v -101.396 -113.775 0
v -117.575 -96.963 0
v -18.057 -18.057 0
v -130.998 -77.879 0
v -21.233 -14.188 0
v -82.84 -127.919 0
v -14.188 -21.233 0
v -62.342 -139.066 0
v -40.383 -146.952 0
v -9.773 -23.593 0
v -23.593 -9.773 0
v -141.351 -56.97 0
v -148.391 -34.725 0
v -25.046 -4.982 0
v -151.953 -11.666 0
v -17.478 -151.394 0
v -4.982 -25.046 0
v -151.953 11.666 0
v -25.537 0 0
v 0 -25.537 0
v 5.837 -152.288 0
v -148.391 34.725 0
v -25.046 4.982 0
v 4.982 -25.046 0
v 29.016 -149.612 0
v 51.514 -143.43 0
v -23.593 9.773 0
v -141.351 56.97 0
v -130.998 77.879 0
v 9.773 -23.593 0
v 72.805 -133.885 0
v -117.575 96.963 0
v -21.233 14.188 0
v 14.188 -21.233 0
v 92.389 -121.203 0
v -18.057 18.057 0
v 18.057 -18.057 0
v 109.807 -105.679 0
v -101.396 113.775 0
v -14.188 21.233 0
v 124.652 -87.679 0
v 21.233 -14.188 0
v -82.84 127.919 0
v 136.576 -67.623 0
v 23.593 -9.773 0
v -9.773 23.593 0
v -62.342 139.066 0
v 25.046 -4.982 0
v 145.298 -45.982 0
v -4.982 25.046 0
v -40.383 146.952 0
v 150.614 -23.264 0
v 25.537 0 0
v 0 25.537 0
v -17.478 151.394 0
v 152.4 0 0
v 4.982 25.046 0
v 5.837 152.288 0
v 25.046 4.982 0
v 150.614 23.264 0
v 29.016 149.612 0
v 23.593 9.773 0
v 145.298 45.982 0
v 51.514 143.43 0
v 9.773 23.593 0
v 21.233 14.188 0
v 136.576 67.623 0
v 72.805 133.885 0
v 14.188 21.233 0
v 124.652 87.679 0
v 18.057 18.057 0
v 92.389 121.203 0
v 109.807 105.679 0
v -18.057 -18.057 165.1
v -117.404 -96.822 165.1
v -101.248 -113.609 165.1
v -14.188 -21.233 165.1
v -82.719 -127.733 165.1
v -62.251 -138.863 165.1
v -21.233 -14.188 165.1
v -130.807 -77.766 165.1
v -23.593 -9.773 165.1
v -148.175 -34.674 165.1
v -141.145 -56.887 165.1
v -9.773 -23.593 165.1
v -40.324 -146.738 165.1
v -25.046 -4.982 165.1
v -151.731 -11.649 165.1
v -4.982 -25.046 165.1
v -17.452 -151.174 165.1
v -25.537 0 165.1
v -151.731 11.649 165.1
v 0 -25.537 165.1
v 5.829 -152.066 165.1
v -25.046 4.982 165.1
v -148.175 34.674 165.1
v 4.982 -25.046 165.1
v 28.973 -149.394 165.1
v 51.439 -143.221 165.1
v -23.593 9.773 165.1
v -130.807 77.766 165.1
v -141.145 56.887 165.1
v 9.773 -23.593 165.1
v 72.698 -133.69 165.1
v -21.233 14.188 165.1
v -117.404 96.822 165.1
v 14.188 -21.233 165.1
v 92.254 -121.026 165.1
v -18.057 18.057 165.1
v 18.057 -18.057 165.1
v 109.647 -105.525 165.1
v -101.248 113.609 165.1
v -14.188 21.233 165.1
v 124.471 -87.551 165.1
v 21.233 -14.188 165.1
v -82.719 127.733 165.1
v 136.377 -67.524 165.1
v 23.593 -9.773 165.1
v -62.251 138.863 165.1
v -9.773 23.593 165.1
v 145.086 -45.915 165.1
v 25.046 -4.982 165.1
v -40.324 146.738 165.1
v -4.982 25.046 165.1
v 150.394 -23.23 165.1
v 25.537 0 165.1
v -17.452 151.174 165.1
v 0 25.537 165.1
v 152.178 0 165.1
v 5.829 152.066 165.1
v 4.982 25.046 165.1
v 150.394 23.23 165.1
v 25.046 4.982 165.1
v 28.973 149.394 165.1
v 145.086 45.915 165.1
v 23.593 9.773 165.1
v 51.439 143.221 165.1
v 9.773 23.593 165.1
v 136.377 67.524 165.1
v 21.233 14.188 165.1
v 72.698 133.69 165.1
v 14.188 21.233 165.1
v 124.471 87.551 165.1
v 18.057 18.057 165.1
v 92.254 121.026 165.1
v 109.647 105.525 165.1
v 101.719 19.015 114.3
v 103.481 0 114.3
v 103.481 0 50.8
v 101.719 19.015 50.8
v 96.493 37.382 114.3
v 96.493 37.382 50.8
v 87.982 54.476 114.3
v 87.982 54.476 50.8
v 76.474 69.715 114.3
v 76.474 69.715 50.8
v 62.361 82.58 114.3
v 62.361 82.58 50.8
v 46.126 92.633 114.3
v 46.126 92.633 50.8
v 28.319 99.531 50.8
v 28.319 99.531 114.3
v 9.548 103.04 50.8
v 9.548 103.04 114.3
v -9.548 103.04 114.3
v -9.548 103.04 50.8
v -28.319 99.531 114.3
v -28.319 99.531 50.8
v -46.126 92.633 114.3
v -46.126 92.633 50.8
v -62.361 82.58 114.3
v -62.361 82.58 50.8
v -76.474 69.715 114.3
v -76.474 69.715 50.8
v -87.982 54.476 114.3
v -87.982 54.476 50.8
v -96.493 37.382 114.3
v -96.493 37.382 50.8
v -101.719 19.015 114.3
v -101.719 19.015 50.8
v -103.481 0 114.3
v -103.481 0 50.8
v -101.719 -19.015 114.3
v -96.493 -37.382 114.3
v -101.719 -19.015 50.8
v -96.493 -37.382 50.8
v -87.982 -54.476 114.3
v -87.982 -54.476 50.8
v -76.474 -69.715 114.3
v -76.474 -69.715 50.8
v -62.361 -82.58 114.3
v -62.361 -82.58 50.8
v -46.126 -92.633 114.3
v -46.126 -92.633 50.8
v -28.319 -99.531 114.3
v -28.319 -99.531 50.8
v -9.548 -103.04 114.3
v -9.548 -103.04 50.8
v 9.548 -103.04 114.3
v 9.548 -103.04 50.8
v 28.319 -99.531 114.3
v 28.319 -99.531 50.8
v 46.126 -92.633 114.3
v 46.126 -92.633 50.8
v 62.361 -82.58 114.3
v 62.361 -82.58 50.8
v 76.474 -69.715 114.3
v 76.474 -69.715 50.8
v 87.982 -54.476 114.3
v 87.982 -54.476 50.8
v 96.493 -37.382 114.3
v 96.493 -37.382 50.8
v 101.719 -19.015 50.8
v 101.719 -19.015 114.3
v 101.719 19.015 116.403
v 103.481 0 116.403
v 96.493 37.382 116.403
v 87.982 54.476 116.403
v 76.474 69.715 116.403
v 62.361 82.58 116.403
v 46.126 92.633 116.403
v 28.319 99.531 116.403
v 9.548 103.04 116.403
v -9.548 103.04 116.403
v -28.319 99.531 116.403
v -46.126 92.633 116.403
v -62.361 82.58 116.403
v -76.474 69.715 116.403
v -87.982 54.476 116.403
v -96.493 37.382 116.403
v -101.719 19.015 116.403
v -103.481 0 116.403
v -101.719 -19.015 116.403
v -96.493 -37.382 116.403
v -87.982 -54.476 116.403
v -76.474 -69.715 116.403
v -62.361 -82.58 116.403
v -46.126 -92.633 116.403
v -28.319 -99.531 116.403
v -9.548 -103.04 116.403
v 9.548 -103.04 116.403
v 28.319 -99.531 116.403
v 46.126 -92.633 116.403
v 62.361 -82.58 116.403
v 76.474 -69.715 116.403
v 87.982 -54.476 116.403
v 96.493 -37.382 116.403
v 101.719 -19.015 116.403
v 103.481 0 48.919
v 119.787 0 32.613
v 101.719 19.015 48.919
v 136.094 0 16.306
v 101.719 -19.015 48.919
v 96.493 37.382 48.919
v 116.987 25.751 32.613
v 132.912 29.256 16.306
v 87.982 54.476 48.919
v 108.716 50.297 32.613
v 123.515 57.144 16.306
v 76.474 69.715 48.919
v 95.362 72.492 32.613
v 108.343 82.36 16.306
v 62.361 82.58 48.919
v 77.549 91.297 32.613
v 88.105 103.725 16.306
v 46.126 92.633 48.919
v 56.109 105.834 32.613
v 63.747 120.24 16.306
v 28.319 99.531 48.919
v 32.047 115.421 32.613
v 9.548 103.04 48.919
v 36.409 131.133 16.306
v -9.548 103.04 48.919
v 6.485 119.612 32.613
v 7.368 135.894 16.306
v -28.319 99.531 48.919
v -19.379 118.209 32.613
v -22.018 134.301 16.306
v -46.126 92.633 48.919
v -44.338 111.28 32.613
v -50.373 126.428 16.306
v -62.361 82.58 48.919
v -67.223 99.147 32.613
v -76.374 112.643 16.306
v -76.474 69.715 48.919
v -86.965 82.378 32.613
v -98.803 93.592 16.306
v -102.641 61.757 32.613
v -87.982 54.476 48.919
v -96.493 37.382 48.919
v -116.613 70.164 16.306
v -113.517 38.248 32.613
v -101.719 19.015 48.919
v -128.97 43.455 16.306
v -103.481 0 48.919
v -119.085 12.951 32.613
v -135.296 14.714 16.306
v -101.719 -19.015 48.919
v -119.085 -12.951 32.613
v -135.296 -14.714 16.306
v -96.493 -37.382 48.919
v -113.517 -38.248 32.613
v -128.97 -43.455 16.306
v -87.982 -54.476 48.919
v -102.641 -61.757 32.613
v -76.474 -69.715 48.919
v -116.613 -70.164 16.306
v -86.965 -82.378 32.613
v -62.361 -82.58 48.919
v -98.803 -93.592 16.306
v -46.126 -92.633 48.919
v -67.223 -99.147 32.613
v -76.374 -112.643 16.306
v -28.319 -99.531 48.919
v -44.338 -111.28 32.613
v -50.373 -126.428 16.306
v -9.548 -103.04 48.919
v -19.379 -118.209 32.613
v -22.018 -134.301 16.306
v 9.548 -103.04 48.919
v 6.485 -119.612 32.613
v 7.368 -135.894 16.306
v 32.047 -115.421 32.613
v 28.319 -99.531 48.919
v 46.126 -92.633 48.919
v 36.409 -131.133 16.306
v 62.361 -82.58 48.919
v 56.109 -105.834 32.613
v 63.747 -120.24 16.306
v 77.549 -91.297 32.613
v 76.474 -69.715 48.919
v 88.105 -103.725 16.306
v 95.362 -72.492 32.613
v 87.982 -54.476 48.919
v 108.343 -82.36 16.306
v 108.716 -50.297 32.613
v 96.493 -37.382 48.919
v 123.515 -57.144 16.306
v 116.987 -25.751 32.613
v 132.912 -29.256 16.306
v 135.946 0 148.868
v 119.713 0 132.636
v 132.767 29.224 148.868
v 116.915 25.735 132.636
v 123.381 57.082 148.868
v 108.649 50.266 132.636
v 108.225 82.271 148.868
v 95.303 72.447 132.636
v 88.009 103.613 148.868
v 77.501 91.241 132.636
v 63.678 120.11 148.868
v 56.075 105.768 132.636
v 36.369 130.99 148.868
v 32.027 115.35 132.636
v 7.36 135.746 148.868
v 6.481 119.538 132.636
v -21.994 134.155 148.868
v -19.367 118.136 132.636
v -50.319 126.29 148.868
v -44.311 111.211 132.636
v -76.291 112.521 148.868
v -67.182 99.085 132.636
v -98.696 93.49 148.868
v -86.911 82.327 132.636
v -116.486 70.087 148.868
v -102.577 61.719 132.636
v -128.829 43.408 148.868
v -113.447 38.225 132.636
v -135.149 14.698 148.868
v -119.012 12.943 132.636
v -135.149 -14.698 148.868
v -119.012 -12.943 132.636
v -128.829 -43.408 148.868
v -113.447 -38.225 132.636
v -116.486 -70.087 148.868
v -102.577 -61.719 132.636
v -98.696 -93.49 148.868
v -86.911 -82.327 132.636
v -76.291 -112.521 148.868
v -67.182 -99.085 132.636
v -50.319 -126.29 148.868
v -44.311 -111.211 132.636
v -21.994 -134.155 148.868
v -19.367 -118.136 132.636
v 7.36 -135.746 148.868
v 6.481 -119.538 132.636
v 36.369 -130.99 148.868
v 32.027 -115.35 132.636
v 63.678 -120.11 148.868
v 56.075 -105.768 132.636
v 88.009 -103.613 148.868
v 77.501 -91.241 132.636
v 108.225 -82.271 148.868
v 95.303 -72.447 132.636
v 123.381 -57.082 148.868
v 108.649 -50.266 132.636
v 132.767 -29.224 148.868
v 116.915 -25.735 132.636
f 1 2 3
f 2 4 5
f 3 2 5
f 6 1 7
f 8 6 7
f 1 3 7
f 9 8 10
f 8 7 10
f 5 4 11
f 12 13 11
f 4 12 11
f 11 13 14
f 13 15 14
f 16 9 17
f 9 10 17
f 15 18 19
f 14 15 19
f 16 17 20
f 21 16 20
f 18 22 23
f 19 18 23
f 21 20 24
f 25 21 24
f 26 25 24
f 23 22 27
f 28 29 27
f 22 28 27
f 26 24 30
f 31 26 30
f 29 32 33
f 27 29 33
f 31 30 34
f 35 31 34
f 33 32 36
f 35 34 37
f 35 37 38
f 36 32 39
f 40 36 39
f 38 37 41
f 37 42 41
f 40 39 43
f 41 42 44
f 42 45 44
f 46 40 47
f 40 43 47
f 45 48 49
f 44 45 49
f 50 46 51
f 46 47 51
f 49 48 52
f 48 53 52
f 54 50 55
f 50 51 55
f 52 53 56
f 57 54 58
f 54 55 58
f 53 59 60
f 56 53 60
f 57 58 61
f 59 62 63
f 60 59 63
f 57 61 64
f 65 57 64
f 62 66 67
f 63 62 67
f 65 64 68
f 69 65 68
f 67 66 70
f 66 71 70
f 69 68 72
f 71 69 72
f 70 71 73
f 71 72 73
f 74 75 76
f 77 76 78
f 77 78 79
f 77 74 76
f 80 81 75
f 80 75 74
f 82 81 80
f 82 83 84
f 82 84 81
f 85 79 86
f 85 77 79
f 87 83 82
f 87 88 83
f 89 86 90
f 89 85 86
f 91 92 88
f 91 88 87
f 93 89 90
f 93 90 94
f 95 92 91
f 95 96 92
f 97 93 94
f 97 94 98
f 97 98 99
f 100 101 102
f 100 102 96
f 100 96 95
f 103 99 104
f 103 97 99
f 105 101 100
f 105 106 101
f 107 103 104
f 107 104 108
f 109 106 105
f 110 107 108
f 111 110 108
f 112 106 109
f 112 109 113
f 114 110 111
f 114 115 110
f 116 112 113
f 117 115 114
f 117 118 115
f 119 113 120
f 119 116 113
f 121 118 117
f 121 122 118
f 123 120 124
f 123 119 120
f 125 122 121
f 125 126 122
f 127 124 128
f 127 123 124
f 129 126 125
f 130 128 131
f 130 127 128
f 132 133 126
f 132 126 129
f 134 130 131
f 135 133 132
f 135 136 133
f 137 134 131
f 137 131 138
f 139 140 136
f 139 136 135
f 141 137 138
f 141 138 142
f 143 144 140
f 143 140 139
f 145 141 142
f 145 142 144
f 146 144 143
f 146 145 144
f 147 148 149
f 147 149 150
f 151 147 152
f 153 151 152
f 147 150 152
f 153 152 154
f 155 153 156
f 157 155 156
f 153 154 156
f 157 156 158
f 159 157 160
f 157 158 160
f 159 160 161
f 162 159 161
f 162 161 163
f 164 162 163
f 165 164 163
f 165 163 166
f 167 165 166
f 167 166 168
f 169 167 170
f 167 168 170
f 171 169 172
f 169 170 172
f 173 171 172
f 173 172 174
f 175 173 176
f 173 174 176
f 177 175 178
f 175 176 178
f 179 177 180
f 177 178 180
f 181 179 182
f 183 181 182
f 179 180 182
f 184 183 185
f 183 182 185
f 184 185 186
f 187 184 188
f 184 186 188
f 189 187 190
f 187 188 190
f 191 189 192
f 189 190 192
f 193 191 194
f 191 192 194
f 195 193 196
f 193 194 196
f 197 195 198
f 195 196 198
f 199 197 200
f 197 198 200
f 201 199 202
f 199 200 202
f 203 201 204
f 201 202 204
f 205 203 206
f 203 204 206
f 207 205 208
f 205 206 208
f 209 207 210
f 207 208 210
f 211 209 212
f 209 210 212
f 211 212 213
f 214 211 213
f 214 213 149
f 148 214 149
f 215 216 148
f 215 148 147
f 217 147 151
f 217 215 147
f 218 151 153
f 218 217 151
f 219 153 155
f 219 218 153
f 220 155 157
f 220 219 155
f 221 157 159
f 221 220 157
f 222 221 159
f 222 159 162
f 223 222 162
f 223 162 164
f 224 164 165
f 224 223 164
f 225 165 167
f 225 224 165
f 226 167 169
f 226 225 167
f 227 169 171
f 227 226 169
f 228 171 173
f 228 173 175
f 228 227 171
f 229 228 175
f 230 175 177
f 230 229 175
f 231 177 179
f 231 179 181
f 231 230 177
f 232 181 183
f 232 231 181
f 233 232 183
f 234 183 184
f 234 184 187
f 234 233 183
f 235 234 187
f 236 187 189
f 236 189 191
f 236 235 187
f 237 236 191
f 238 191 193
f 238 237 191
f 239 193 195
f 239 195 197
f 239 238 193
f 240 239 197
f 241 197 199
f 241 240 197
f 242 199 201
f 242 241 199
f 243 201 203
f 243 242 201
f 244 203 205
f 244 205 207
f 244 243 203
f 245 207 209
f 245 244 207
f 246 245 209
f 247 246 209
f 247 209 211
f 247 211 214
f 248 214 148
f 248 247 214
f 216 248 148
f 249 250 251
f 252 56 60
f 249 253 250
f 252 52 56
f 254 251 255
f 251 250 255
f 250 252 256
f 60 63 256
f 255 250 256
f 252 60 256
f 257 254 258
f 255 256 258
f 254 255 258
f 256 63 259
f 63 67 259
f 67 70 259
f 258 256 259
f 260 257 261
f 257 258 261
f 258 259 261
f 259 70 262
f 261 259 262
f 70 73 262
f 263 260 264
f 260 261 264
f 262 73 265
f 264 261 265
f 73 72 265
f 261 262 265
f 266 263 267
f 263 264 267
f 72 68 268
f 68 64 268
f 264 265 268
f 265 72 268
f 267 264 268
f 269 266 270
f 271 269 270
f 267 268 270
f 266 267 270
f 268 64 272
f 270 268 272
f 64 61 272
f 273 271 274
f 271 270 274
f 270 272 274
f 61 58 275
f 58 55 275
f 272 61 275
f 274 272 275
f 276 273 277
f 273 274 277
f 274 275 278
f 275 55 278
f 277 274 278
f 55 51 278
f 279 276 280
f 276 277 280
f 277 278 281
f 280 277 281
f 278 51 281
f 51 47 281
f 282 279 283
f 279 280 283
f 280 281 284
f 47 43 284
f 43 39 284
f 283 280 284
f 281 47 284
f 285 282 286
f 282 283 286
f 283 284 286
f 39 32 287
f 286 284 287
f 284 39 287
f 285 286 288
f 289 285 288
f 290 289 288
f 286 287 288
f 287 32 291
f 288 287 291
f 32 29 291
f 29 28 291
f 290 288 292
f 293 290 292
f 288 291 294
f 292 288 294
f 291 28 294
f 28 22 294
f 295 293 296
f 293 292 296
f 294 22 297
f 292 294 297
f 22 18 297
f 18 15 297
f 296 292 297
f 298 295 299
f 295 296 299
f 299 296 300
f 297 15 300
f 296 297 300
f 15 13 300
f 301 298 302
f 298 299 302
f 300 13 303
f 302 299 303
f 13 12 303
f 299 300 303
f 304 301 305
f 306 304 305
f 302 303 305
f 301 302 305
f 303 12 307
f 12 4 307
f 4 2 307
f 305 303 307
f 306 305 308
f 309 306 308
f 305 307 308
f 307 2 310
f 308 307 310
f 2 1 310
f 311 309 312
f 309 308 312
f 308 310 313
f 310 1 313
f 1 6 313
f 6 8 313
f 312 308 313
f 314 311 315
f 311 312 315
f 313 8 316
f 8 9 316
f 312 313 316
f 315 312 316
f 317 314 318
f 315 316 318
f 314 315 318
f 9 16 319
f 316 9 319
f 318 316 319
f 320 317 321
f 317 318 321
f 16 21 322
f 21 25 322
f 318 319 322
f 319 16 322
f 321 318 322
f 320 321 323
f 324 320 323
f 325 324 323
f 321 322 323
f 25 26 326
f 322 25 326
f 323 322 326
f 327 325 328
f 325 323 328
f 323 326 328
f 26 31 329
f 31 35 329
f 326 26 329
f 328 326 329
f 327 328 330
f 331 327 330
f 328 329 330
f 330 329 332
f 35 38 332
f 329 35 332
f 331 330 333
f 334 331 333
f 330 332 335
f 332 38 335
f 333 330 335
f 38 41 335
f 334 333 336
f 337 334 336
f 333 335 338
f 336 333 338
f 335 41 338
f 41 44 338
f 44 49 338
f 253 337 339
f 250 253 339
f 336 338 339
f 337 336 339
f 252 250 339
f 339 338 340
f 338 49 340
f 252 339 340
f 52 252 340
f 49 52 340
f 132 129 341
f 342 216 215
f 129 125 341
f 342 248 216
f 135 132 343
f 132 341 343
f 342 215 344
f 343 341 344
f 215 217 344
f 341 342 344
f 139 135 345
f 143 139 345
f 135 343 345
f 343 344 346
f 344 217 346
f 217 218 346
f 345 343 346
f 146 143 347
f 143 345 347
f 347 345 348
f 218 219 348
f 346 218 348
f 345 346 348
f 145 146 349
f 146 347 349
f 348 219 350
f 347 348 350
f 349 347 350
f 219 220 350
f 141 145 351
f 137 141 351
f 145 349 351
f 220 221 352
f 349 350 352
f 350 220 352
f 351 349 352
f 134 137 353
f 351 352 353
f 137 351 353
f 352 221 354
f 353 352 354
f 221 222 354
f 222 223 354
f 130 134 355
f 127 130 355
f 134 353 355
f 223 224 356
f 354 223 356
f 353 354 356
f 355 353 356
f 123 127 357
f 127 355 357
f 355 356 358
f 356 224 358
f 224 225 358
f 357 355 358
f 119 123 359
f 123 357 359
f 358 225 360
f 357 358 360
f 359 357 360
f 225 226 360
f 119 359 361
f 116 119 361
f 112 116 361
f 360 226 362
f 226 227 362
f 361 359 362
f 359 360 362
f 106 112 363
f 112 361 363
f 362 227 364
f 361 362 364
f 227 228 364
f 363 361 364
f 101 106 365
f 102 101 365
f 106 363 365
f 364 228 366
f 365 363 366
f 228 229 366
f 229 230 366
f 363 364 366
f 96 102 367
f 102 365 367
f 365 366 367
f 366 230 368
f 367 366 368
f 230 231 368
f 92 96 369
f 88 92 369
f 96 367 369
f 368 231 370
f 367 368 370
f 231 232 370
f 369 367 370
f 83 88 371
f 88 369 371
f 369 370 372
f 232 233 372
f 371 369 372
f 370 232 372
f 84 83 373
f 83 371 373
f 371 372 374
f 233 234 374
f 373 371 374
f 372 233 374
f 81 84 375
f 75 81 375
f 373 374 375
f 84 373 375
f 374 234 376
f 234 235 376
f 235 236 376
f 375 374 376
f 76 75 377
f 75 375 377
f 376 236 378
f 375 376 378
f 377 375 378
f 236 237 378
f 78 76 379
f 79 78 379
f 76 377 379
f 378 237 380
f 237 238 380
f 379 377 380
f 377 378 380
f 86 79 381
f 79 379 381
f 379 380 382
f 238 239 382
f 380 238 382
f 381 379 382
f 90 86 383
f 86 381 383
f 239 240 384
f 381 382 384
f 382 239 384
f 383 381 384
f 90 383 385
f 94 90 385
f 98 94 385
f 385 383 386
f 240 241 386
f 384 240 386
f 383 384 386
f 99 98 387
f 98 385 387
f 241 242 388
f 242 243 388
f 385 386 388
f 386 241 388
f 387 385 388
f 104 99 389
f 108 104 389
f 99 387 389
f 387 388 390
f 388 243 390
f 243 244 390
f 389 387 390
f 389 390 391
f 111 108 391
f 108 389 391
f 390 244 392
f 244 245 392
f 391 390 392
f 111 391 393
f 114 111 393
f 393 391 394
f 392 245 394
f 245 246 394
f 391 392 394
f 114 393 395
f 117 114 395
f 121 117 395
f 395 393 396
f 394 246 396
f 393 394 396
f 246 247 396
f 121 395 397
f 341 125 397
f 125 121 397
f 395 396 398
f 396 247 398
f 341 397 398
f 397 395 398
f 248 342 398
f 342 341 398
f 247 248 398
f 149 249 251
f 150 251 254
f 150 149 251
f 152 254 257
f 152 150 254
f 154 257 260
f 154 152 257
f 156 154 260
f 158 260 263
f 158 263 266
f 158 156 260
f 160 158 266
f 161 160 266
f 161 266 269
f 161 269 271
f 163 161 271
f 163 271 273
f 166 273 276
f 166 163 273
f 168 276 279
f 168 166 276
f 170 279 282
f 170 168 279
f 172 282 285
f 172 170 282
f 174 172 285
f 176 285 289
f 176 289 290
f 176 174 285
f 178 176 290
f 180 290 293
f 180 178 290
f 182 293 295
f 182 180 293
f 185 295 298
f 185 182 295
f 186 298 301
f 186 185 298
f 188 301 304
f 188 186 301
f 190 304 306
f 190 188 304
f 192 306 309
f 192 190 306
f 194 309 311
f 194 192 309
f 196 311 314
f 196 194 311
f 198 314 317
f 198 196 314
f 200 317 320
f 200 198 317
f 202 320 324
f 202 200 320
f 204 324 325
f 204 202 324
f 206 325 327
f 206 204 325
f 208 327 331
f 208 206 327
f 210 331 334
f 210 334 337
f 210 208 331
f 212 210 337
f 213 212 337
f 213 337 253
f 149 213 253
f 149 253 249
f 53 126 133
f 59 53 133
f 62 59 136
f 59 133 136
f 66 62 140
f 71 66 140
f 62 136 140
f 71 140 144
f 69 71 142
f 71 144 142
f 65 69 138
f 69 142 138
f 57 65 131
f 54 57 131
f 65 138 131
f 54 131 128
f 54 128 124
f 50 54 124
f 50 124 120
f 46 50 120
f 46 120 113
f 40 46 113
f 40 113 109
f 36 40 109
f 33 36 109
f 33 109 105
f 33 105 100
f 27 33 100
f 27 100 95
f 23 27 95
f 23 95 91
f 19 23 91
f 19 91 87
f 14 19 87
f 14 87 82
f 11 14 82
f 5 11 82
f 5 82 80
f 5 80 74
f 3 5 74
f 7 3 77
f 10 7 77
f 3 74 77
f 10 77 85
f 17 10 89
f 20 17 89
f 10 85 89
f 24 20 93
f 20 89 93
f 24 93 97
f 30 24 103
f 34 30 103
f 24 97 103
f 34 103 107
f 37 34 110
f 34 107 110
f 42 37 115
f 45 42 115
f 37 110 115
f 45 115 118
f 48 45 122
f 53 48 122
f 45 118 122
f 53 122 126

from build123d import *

# Parameters (mm, degrees)
F0_R        = 152.4
F1_DEPTH    = 50.8
F2_R        = 103.4812283395
F3_DEPTH    = 63.5
F5_R        = 152.1778472169
F6_DEPTH    = 50.8
F7_S5_R     = 103.4812283395
F7_T6_DEPTH = 218
F8_S5_R     = 103.4812283395
F8_T6_DEPTH = 219
F9_R        = 25.5370078958
F10_DEPTH   = 203.2


# Not quite as in the source:
# - a fillet or chamfer that OpenCascade refuses, or shapes differently, is made with other operations: its cross-section is extruded or revolved along the edge and cut away or added


with BuildPart() as f1:
    # F0 (on Top) → F1 (new body)
    with BuildSketch(Plane.XY):
        Circle(F0_R)
    extrude(amount=F1_DEPTH)

    # F2 (on face) → F3 (join)
    with BuildSketch(Plane.XY.offset(50.8)):
        Circle(F2_R)
    extrude(amount=F3_DEPTH)

    # F5 (on face) → F6 (join)
    with BuildSketch(Plane.XY.offset(114.3)):
        Circle(F5_R)
    extrude(amount=F6_DEPTH)

    # F7: chamfer of 50.8 on 1 edges, made by hand


with BuildPart() as f7_tool2:
    # F7_s3 → F7_t4 (revolve)
    with BuildSketch(Plane.XZ):
        Polygon((152.1778472169, 165.1), (101.3778472169, 114.3), (152.1778472169, 114.3), align=None)
    revolve(axis=Axis((0, 0, 114.3), (0, 0, 1)))

    # F7_s5 → F7_t6 (cut, symmetric)
    with BuildSketch(Plane.XY.offset(139.7)):
        Circle(F7_S5_R)
    extrude(amount=F7_T6_DEPTH, both=True, mode=Mode.SUBTRACT)


with BuildPart() as f1_1:
    add(f1.part)

    # F7_t1: cut F7_tool2
    add(f7_tool2.part, mode=Mode.SUBTRACT)

    # F8: chamfer of 50.8 on 1 edges, made by hand


with BuildPart() as f8_tool2:
    # F8_s3 → F8_t4 (revolve)
    with BuildSketch(Plane.XZ):
        Polygon((101.6, 50.8), (152.4, 0), (152.4, 50.8), align=None)
    revolve(axis=Axis((0, 0, 50.8), (0, 0, 1)))

    # F8_s5 → F8_t6 (cut, symmetric)
    with BuildSketch(Plane.XY.offset(25.4)):
        Circle(F8_S5_R)
    extrude(amount=F8_T6_DEPTH, both=True, mode=Mode.SUBTRACT)


with BuildPart() as f1_2:
    add(f1_1.part)

    # F8_t1: cut F8_tool2
    add(f8_tool2.part, mode=Mode.SUBTRACT)

    # F9 (on face) → F10 (cut)
    with BuildSketch(Plane.XY.offset(165.1)):
        Circle(F9_R)
    extrude(amount=-F10_DEPTH, mode=Mode.SUBTRACT)


solid = f1_2.part
